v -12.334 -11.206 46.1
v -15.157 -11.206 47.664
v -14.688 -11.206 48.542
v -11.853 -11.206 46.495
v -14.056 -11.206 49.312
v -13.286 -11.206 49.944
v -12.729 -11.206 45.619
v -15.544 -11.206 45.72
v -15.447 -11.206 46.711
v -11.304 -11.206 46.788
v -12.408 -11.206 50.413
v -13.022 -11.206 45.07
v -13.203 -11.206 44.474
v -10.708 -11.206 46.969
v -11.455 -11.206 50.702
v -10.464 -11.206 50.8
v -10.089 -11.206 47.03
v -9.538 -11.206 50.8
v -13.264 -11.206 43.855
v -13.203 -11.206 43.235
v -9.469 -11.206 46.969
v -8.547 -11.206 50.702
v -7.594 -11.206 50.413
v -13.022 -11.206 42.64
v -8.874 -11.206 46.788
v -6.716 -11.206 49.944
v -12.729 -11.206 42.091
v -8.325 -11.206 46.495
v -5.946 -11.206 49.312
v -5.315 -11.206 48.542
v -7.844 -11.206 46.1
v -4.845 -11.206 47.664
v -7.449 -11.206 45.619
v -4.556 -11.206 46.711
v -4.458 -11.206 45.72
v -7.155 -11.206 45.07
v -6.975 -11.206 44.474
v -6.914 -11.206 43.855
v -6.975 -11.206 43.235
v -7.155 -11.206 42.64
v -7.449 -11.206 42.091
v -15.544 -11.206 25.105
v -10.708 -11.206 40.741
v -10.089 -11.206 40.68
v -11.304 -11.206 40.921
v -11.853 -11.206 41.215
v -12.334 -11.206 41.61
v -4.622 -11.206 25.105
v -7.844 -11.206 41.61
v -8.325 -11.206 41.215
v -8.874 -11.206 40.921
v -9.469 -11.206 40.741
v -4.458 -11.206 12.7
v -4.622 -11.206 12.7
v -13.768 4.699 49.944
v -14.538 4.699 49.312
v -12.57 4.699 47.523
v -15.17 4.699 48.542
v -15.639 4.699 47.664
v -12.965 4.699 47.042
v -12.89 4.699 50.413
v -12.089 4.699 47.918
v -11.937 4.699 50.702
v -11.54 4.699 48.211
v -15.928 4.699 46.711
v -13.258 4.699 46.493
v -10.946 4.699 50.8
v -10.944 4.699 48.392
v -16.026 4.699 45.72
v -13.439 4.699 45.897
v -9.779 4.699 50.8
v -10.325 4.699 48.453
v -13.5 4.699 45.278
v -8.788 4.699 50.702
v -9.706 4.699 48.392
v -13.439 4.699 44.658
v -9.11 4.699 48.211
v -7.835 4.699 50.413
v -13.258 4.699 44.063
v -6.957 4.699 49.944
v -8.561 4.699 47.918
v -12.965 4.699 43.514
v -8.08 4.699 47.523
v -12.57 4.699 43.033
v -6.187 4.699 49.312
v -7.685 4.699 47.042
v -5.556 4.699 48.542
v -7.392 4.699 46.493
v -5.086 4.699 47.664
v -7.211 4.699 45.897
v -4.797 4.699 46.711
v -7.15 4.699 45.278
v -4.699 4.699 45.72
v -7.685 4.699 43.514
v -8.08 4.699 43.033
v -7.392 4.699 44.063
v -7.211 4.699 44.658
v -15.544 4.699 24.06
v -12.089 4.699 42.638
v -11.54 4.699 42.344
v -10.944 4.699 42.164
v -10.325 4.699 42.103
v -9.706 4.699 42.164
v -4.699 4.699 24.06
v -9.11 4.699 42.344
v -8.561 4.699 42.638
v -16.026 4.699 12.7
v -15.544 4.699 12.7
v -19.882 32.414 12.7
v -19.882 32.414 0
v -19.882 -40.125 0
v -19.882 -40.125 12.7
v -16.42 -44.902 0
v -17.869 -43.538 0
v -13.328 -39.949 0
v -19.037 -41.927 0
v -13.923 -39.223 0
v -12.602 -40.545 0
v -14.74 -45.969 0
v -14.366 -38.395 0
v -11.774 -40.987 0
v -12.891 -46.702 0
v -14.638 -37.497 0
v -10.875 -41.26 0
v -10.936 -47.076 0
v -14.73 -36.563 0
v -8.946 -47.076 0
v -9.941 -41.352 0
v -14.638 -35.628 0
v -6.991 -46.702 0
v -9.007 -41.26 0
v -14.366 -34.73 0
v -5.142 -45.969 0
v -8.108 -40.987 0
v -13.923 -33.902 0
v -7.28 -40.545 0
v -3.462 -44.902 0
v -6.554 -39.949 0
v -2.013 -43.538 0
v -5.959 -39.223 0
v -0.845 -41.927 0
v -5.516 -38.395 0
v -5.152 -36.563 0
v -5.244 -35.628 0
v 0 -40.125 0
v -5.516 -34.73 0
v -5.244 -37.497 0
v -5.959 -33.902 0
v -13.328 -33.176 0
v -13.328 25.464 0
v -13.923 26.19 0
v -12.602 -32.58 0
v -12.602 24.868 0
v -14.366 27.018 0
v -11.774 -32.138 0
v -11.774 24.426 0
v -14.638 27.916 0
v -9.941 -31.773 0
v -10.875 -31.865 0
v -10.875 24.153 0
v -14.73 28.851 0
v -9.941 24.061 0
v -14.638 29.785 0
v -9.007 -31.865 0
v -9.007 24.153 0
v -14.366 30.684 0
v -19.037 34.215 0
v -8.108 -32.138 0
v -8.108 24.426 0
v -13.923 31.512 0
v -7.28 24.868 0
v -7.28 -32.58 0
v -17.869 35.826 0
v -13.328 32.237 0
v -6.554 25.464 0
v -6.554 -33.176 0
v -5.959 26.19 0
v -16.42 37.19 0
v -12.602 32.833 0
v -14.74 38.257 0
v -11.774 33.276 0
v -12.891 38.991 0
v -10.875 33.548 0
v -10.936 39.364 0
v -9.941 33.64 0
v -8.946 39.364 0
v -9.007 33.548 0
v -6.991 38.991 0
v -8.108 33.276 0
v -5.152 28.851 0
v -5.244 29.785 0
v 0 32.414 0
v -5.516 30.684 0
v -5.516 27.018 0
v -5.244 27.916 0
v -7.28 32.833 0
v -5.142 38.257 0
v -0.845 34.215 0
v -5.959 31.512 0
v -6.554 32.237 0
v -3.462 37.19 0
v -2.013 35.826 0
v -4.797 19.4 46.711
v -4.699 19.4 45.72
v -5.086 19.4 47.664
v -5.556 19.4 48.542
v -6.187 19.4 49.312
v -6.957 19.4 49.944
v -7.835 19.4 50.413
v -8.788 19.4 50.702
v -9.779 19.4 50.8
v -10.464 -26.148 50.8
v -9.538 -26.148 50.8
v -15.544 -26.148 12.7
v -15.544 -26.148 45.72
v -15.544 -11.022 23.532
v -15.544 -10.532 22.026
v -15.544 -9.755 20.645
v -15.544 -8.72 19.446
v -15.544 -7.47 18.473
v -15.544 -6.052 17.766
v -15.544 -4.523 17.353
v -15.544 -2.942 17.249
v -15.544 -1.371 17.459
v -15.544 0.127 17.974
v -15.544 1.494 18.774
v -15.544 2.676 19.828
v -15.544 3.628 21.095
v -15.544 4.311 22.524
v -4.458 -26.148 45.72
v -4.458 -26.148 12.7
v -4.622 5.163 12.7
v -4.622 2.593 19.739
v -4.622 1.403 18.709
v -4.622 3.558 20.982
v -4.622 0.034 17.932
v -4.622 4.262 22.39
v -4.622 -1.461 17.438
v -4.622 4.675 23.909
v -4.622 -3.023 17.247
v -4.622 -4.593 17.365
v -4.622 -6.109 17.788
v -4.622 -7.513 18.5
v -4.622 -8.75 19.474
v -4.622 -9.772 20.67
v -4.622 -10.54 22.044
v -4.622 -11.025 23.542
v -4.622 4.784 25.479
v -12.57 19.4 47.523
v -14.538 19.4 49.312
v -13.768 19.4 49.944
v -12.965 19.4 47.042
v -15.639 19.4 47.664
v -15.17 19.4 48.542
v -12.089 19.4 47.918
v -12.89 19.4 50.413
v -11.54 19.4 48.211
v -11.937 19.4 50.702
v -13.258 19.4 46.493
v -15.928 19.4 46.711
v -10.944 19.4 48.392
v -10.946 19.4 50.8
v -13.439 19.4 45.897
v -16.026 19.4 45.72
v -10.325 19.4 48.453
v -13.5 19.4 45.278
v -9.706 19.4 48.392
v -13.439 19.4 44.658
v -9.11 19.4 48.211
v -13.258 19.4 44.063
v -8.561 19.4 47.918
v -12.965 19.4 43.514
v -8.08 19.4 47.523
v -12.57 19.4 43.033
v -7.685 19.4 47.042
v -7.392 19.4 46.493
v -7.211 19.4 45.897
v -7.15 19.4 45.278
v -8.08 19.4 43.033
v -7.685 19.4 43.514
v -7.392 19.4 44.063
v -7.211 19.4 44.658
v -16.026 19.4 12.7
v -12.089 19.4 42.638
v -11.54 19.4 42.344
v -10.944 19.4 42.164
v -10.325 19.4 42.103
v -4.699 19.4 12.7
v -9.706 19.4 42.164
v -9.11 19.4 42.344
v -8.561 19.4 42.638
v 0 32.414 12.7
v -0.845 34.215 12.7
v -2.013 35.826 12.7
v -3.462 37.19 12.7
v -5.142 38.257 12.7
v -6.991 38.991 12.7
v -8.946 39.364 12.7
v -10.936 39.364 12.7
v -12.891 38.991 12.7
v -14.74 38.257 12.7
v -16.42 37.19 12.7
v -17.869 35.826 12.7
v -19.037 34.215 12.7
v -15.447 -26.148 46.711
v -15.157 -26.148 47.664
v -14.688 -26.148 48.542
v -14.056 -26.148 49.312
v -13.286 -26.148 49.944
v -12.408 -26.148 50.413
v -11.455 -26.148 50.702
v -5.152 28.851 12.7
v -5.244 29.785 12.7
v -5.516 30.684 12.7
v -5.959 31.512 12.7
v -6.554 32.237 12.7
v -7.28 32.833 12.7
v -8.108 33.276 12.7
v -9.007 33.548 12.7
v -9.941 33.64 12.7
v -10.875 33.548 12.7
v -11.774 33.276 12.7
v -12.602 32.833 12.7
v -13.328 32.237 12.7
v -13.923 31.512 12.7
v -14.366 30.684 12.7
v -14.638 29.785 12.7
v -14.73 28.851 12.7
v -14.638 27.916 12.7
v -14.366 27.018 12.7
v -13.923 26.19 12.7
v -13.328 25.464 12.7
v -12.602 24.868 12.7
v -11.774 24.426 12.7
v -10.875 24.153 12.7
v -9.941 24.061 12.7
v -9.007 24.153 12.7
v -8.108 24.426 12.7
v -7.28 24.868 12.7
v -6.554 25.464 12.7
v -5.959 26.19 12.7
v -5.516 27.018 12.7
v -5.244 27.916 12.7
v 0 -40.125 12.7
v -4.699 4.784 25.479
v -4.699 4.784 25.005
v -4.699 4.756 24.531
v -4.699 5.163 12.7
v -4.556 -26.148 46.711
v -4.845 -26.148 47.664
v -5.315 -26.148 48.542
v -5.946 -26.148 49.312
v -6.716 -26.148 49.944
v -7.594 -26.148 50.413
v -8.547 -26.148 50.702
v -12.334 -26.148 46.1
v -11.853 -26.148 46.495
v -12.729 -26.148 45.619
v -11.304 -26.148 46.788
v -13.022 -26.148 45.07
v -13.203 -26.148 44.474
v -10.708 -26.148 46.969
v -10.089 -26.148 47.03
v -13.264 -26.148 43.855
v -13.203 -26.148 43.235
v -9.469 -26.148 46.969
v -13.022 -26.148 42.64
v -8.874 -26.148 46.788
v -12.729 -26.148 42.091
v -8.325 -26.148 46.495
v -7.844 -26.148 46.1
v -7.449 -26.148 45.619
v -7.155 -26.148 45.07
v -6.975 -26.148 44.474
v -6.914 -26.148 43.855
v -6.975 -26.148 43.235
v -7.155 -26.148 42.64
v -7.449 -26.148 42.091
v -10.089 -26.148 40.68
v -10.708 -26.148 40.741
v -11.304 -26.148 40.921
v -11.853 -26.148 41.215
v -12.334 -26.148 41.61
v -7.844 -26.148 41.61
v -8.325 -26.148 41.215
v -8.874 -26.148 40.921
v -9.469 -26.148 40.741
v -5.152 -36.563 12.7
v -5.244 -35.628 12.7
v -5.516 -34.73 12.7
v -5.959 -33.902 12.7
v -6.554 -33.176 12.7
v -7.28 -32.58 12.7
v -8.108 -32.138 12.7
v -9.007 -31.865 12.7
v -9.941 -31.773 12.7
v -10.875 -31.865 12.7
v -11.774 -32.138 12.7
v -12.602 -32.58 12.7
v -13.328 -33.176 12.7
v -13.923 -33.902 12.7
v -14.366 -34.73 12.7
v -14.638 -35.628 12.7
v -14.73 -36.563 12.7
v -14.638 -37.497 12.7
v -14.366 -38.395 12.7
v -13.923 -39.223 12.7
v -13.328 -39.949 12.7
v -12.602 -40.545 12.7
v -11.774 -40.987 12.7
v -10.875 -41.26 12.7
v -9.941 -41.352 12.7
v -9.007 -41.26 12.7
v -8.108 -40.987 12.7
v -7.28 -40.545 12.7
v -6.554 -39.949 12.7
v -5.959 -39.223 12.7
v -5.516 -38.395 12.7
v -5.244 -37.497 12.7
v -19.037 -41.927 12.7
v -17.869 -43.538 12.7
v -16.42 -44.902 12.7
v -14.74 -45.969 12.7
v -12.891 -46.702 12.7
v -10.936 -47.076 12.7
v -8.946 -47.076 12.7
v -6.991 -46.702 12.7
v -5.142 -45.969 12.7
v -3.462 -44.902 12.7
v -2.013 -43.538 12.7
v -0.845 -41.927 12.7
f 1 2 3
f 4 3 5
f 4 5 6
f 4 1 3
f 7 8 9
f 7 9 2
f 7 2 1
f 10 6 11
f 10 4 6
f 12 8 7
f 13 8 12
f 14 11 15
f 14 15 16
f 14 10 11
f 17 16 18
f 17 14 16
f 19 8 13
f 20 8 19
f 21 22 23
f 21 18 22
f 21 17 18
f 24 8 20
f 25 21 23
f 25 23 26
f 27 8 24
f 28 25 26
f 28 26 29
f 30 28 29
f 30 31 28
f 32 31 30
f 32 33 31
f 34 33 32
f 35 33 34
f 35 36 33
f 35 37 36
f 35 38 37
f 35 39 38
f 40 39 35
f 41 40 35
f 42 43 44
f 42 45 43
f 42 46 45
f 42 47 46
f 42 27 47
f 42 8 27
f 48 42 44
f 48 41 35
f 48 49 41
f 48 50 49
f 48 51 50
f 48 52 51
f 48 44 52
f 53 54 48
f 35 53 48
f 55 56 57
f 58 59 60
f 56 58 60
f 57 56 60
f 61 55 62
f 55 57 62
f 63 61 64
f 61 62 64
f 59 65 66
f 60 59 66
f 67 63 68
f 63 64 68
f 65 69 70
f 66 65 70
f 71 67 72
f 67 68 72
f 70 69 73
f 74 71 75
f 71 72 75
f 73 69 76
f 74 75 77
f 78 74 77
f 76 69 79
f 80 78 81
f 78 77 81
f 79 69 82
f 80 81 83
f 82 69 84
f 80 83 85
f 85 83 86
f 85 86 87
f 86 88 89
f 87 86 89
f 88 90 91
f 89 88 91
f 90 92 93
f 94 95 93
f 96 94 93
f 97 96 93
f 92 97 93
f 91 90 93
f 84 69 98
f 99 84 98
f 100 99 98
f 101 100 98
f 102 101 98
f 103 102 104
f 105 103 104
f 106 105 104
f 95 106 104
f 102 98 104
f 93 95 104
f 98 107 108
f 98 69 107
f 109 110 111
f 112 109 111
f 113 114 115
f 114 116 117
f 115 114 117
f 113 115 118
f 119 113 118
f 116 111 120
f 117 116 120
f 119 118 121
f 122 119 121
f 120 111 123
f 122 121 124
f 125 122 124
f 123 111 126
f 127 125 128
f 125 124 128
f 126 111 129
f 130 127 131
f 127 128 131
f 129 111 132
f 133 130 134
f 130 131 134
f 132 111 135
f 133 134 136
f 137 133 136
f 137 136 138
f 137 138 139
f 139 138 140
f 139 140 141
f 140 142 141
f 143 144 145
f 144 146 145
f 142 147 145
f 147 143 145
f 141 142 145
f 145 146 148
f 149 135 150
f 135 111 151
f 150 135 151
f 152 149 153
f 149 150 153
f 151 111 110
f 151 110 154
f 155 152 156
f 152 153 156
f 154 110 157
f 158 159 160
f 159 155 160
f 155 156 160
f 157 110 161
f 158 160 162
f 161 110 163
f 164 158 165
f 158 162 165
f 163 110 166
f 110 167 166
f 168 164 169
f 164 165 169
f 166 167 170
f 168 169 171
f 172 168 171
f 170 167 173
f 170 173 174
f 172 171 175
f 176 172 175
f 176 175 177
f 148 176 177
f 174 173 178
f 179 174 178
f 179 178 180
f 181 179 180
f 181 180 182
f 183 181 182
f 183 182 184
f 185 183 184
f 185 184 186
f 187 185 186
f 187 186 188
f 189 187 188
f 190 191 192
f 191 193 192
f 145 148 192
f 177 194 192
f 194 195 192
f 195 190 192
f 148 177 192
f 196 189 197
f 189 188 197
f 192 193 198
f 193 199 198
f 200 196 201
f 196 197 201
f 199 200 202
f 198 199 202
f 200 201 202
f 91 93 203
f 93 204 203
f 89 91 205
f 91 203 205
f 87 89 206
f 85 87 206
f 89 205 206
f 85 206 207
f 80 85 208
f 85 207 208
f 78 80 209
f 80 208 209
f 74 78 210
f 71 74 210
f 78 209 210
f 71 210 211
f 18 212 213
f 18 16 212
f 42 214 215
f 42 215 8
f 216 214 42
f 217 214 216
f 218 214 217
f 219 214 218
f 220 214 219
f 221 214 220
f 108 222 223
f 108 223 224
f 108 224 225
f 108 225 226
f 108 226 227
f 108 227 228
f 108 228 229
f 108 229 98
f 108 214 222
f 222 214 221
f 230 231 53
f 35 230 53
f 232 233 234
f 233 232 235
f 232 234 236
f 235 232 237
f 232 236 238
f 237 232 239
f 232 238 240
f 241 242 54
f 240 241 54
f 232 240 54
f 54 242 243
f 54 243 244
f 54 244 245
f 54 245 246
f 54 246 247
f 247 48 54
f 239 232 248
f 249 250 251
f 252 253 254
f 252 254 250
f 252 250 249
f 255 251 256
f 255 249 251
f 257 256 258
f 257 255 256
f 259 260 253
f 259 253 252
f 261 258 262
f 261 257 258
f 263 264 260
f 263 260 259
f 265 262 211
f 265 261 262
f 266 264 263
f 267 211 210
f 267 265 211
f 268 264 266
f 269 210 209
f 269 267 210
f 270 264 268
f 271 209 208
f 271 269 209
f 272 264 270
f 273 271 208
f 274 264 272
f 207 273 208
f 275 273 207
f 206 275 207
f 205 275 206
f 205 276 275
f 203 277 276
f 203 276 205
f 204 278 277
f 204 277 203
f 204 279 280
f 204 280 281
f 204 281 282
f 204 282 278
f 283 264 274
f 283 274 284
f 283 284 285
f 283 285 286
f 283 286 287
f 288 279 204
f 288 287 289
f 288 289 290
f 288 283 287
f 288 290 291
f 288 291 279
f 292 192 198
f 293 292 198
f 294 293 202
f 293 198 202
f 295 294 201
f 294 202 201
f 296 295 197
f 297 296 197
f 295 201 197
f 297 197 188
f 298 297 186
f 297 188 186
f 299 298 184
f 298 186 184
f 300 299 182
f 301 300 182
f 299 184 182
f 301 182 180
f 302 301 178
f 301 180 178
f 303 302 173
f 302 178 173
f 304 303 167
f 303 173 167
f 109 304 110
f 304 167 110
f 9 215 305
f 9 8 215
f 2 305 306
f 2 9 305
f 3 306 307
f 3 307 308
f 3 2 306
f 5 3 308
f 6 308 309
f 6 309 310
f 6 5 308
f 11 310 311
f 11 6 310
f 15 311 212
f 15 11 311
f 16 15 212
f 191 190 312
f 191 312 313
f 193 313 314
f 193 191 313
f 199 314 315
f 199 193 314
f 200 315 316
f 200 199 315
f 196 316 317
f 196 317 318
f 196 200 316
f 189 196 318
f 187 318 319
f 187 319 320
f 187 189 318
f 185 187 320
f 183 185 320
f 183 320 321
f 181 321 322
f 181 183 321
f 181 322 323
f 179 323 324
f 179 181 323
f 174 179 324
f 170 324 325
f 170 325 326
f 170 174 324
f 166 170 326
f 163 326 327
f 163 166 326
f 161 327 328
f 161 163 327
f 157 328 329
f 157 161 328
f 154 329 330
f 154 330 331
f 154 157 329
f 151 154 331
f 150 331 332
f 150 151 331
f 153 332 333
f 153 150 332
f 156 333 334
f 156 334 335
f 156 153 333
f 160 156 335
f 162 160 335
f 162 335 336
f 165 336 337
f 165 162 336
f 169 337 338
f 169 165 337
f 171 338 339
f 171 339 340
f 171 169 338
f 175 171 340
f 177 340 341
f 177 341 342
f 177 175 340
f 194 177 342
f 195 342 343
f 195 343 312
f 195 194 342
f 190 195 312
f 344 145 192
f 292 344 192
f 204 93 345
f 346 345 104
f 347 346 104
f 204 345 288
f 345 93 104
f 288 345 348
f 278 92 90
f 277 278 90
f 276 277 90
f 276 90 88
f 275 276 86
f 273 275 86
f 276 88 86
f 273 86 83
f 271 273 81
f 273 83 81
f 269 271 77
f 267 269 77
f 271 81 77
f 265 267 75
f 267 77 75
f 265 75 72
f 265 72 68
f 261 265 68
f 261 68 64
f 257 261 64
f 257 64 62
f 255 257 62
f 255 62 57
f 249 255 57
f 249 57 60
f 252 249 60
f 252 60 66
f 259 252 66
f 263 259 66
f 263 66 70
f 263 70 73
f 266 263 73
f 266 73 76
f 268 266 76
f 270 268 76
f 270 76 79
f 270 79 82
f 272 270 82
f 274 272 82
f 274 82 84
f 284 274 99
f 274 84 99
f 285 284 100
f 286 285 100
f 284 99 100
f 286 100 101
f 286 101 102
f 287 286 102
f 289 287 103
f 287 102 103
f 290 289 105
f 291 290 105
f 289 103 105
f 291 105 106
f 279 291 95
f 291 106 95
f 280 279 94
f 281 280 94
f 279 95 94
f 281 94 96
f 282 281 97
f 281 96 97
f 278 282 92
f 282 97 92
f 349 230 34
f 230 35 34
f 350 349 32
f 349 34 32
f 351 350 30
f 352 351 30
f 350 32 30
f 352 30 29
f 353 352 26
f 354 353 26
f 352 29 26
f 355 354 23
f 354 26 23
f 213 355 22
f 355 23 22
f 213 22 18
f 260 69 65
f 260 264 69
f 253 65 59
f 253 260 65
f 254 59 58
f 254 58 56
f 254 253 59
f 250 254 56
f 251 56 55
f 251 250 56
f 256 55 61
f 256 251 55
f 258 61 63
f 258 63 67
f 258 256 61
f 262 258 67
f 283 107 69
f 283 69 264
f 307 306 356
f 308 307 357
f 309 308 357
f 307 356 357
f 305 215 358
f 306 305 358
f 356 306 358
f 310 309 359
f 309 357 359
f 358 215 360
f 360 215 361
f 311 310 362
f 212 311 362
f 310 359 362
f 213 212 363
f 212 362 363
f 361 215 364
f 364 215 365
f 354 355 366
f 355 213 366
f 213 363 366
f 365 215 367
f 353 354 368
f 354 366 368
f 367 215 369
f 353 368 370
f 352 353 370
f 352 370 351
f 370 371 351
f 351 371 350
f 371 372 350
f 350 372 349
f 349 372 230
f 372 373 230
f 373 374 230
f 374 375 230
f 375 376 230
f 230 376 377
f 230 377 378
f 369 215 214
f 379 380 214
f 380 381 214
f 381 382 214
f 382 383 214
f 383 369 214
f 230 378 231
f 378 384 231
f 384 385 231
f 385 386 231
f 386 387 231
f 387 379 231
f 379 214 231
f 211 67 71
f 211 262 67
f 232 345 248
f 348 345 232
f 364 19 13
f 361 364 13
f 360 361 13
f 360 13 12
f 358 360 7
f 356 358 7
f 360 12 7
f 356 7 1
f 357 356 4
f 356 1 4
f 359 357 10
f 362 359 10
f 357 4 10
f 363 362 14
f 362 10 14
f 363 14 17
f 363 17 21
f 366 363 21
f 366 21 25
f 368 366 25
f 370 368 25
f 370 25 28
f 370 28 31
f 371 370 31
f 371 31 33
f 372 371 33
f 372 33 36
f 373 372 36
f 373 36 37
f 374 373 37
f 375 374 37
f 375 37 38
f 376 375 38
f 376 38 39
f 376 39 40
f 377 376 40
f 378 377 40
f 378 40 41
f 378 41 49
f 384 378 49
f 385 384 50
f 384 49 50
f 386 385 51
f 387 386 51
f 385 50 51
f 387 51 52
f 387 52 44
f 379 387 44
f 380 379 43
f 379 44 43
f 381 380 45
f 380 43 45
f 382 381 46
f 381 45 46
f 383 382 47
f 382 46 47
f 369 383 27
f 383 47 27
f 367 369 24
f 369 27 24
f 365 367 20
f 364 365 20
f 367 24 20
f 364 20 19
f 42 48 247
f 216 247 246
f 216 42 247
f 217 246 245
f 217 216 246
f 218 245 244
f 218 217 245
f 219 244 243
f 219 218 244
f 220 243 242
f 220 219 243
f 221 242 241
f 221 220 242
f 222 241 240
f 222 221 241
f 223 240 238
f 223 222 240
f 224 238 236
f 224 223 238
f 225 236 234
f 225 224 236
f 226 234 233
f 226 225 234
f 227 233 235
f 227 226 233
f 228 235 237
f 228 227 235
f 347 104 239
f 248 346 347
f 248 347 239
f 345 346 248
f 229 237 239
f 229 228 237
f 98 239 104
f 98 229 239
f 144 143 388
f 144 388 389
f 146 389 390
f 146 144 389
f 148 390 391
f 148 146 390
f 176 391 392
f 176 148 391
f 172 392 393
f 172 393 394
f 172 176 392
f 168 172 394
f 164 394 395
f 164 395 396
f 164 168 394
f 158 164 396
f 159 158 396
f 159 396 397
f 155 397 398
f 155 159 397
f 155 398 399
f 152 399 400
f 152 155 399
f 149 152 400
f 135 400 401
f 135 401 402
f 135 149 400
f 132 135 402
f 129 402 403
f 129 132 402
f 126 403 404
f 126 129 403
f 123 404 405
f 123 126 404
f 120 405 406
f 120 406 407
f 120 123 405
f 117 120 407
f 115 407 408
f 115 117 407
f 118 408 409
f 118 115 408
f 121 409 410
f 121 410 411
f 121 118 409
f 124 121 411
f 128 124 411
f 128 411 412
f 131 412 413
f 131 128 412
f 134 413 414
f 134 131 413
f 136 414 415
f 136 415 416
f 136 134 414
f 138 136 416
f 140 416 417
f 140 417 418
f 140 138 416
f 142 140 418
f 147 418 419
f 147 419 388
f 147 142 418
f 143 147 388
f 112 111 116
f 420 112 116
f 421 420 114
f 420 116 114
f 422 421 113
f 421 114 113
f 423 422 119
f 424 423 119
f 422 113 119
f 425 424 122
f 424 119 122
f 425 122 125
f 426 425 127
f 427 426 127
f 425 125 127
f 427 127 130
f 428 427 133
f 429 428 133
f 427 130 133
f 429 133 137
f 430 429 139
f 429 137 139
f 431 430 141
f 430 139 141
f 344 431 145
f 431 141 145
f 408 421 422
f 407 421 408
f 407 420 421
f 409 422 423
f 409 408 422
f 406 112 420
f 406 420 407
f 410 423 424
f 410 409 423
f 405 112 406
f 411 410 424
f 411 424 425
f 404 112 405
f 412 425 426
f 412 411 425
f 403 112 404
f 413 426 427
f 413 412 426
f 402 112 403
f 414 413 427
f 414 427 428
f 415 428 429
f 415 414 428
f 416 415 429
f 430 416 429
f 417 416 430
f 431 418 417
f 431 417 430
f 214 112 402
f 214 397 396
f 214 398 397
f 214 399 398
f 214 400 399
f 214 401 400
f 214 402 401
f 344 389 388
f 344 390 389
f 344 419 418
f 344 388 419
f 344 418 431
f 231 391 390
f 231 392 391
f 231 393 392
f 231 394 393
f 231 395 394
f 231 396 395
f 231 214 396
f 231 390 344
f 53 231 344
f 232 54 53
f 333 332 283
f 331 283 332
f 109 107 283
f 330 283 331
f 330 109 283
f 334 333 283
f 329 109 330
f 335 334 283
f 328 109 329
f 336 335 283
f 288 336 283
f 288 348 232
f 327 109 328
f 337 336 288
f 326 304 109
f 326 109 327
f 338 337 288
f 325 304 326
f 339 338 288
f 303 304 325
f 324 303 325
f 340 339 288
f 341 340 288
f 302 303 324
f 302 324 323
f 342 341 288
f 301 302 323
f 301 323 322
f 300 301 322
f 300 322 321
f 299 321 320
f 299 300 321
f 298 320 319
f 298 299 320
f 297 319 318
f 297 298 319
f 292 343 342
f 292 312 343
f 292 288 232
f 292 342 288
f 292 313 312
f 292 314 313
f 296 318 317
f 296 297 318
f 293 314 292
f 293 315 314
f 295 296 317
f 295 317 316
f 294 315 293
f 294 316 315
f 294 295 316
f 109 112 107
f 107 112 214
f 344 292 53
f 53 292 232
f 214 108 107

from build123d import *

# Parameters (mm, degrees)
F0_R      = 4.789486544
F1_DEPTH  = 12.7
F2_W      = 11.0857239924
F2_H      = 14.9416252971
F3_DEPTH  = 38.1
F5_D      = 6.35
F6_R      = 5.08
F8_W      = 11.3267181441
F8_H      = 14.700633008
F9_DEPTH  = 38.1
F11_D     = 6.35
F11_DEPTH = 25.4
F11_TIP   = 1.9077324654
F12_R     = 5.08
F14_DEPTH = 10.922


with BuildPart() as f1:
    # F0 (on Top) → F1 (new body)
    with BuildSketch(Plane.XY):
        with BuildLine():
            ThreePointArc((0, 32.4136912823), (-9.941002354, 39.4109395409), (-19.8820047081, 32.4136912823))
            Line((-19.8820047081, 32.4136912823), (-19.8820047081, -40.1254966855))
            ThreePointArc((-19.8820047081, -40.1254966855), (-9.941002354, -47.1227449441), (0, -40.1254966855))
            Line((0, -40.1254966855), (0, 32.4136912823))
        make_face()
        with Locations((-9.941002354, -36.5625214439)):
            Circle(F0_R, mode=Mode.SUBTRACT)
        with Locations((-9.941002354, 28.8507160407)):
            Circle(F0_R, mode=Mode.SUBTRACT)
    extrude(amount=F1_DEPTH)

    # F2 (on face) → F3 (join)
    with BuildSketch(Plane.XY.offset(12.7)):
        with Locations((-10.0012498442, -18.677033484)):
            Rectangle(F2_W, F2_H)
    extrude(amount=F3_DEPTH)

    # F5 (through all)
    with Locations(Plane.XZ.offset(26.1478461325)):
        with Locations((-10.0886579603, 43.8547693193)):
            Hole(F5_D / 2)

    # F6
    f6_edges = [f1.edges().sort_by_distance(p)[0] for p in [
        (-4.458388, -18.677033, 50.8),
        (-15.544112, -18.677033, 50.8),
    ]]
    fillet(f6_edges, radius=F6_R)

    # F8 (on face) → F9 (join)
    with BuildSketch(Plane.XY.offset(12.7)):
        with Locations((-10.3627410717, 12.0496989693)):
            Rectangle(F8_W, F8_H)
    extrude(amount=F9_DEPTH)

    # F11
    with Locations(Plane(origin=(0, 19.4000154734, 0), x_dir=(-1, 0, 0), z_dir=(0, 1, 0))):
        with Locations((10.3249410167, 45.2776290476)):
            Hole(F11_D / 2, depth=F11_DEPTH)
            with Locations((0, 0, -(F11_DEPTH + F11_TIP / 2))):  # 118° drill point
                Cone(0, F11_D / 2, F11_TIP, mode=Mode.SUBTRACT)

    # F12
    f12_edges = [f1.edges().sort_by_distance(p)[0] for p in [
        (-4.699382, 12.049699, 50.8),
        (-16.0261, 12.049699, 50.8),
    ]]
    fillet(f12_edges, radius=F12_R)

    # F13 (on face) → F14 (join)
    with BuildSketch(Plane(origin=(-15.5441118404, 0, 0), x_dir=(0, -1, 0), z_dir=(-1, 0, 0))):
        with BuildLine():
            Line((11.2062208354, 25.3779198974), (11.2062208354, 25.1054665343))
            ThreePointArc((11.2062208354, 25.1054665343), (11.2073811699, 25.2416932159), (11.2062208354, 25.3779198974))
        make_face()
        with BuildLine():
            ThreePointArc((11.2062208354, 25.1054665343), (3.0232009523, 17.2465905604), (-4.783663433, 25.4792459309))
            Line((-4.783663433, 25.4792459309), (-5.1880729605, 11.8706798134))
            Line((-5.1880729605, 11.8706798134), (11.2062208354, 12.7))
            Line((11.2062208354, 12.7), (11.2062208354, 25.1054665343))
        make_face()
    extrude(amount=-F14_DEPTH)


solid = f1.part
